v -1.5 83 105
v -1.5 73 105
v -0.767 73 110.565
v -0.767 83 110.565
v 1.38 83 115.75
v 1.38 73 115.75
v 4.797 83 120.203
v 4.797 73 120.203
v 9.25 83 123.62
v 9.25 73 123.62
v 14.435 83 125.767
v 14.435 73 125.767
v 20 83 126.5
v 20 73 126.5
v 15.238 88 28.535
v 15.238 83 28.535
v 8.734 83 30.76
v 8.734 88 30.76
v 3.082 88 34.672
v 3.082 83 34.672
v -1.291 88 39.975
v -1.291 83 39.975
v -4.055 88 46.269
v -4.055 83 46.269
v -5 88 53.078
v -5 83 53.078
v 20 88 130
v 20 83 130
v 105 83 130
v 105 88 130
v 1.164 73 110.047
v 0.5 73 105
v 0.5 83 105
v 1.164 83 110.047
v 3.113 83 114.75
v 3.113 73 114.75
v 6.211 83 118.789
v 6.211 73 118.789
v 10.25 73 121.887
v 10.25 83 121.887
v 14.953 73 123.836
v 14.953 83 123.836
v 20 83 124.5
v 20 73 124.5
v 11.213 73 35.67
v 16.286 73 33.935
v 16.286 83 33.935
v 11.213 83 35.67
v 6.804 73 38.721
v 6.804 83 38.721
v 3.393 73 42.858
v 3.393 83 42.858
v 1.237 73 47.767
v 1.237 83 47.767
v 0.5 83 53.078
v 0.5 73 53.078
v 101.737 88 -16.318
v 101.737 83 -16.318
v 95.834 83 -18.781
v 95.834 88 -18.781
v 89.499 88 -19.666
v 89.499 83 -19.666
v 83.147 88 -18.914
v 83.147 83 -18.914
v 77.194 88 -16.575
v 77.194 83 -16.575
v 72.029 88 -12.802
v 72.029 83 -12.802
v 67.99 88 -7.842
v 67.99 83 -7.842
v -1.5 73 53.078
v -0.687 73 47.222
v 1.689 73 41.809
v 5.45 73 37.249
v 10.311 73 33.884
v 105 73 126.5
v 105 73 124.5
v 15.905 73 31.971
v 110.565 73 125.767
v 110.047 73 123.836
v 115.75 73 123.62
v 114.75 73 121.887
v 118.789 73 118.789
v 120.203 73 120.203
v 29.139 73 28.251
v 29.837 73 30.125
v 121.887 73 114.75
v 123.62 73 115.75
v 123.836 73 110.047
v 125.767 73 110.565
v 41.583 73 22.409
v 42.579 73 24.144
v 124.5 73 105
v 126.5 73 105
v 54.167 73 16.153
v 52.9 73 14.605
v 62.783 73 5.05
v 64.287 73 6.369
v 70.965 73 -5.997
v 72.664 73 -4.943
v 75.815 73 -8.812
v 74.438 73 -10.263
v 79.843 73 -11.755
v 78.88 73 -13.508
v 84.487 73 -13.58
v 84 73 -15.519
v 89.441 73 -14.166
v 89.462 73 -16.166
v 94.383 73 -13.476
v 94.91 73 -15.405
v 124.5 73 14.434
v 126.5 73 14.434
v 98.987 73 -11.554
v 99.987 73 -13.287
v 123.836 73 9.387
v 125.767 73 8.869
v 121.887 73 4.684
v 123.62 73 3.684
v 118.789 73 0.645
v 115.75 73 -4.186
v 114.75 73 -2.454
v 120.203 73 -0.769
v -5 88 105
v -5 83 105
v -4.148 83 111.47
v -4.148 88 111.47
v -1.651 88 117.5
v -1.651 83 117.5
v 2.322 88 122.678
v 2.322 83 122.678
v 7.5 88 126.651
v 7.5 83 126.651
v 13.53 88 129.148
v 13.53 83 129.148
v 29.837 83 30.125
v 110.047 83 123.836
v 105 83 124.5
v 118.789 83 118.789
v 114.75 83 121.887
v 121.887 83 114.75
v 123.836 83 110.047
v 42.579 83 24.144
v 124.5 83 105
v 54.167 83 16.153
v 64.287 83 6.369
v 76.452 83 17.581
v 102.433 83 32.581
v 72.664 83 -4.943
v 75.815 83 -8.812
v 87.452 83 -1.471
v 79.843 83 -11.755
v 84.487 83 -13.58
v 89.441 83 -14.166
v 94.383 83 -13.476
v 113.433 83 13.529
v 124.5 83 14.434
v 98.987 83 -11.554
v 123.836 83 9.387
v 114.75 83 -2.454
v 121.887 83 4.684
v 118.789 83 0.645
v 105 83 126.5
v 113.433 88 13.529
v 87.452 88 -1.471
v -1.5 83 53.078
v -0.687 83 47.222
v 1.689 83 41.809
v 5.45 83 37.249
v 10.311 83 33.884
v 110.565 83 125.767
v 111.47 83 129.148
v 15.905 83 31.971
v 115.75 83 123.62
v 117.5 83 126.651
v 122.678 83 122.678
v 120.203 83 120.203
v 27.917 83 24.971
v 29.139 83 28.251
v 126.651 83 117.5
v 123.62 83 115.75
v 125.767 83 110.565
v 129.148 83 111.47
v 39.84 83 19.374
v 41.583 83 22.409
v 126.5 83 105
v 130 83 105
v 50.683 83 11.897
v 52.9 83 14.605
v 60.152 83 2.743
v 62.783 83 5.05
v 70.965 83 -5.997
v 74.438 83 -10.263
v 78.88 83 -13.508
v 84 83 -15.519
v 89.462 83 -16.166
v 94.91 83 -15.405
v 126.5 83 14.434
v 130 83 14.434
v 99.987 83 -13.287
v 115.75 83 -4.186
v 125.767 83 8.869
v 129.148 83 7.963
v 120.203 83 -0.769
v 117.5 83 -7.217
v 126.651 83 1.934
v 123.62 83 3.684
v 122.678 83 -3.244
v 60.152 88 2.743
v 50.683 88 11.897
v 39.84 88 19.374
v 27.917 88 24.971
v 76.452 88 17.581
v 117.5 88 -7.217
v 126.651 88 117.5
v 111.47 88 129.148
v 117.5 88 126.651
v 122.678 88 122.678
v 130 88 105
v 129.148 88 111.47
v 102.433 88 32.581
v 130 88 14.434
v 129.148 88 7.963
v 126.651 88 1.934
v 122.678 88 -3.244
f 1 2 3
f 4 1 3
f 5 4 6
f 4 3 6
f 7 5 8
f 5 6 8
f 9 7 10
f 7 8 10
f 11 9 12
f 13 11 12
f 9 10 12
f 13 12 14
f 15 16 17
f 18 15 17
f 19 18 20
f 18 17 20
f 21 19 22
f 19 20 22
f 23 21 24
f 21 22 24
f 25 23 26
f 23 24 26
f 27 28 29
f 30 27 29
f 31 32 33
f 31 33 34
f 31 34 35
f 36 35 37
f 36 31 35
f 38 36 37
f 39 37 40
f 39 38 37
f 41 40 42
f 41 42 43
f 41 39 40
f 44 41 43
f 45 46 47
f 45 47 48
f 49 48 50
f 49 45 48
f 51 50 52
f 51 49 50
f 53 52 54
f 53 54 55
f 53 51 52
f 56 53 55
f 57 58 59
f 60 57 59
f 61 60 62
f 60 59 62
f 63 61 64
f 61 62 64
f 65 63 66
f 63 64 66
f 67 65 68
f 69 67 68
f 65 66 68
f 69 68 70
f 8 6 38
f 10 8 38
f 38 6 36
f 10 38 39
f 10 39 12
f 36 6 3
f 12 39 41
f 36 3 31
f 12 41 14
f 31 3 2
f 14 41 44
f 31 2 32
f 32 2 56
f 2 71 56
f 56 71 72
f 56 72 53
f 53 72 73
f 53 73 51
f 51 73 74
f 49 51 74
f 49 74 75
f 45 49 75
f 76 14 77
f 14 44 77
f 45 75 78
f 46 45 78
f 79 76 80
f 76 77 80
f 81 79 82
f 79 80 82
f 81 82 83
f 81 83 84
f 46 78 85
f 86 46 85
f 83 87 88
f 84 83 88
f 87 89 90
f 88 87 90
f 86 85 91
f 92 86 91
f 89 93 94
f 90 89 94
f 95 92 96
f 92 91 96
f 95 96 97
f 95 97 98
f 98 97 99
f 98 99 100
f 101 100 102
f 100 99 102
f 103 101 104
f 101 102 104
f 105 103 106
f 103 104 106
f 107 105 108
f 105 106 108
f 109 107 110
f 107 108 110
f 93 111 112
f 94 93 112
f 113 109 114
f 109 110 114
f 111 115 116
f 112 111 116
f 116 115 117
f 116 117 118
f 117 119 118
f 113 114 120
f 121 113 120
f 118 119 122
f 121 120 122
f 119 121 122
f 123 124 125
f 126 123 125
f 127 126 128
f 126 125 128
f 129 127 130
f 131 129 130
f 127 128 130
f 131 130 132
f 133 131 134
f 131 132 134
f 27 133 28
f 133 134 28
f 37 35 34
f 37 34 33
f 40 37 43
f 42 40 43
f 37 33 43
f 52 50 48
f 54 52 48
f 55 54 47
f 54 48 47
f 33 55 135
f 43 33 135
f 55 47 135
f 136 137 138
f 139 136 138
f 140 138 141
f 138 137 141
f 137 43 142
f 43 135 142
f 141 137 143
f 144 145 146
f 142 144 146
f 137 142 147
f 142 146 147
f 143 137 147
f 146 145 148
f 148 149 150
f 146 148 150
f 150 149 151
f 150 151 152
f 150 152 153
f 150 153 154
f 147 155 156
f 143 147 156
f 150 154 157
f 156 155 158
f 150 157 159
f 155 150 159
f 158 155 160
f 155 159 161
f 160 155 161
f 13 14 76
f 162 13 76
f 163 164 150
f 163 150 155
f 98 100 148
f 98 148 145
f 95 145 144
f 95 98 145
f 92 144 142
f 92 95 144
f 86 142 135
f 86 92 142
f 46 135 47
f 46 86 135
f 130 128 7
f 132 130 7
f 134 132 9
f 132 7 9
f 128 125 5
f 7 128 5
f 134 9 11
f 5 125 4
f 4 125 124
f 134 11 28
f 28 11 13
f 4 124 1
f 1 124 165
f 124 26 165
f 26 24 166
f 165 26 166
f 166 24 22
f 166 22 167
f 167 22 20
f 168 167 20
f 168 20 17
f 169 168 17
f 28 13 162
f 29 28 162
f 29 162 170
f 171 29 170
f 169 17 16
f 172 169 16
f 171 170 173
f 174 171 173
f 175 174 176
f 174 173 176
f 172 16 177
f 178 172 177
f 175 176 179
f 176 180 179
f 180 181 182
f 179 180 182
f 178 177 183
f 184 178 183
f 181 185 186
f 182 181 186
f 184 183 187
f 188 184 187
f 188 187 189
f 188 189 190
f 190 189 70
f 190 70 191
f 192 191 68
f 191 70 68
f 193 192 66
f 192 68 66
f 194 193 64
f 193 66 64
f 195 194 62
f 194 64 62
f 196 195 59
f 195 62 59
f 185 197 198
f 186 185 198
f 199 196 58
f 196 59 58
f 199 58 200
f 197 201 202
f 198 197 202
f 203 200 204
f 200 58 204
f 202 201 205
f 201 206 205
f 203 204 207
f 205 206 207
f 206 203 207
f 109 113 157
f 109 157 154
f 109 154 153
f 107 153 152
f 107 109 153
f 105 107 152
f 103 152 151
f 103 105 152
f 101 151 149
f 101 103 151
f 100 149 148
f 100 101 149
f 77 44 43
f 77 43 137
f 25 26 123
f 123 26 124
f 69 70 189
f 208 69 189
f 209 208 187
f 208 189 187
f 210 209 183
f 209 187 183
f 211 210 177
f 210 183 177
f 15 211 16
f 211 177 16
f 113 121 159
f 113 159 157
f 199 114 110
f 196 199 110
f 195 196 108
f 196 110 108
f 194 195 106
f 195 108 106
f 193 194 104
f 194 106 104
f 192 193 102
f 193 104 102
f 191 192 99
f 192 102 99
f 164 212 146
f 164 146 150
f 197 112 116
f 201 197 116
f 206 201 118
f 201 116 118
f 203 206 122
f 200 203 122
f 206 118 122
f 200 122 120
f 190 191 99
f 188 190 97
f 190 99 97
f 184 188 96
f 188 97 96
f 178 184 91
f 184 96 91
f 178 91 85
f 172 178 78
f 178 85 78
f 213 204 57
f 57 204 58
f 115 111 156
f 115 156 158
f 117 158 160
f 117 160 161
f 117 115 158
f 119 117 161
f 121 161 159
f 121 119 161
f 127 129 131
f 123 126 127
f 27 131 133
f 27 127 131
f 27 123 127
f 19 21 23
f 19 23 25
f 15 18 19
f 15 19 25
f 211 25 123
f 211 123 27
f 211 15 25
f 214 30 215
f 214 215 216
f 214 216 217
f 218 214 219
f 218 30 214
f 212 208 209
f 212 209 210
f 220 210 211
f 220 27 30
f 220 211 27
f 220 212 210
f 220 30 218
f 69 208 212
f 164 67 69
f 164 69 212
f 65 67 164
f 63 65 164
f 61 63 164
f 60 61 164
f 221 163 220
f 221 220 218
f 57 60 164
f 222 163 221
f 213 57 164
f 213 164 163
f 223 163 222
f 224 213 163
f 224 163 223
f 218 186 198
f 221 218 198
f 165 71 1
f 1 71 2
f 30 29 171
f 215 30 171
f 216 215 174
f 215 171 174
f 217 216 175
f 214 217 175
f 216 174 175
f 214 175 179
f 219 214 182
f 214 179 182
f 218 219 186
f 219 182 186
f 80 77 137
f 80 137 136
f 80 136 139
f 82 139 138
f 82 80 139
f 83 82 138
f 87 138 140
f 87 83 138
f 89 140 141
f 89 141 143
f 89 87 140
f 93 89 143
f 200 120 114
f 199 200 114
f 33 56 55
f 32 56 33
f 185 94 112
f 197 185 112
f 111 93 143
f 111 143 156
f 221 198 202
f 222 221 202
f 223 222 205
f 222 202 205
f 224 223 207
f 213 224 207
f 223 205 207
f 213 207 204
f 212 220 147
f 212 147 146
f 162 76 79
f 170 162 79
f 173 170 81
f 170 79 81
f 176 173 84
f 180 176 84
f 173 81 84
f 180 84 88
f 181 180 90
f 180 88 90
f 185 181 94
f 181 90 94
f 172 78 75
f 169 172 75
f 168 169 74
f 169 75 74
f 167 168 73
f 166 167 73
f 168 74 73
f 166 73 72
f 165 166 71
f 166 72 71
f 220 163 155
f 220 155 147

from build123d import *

# Parameters (mm, degrees)
SKETCH1_W               = 260
SKETCH1_H               = 100
BOSS_EXTRUDE1_DEPTH     = 3
CUT_EXTRUDE1_DEPTH      = 5
SKETCH5_W               = 260
SKETCH5_H               = 80
BOSS_EXTRUDE4_DEPTH     = 3
BOSS_EXTRUDE5_START     = 70
BOSS_EXTRUDE5_DEPTH     = 70
BOSS_EXTRUDE6_DEPTH     = 70
CUT_EXTRUDE3_DEPTH      = 198.810515393
SKETCH10_R              = 5
SKETCH10_R_2            = 1.75
BOSS_EXTRUDE7_DEPTH     = 50
CHAMFER1_SIZE           = 5
CHAMFER1_SIZE2          = 8.660254038
FILLET1_R               = 22
FILLET2_R               = 25
CUT_EXTRUDE4_START      = 20
CUT_EXTRUDE4_DEPTH      = 20
SKETCH12_R              = 1.75
CUT_EXTRUDE5_DEPTH      = 20
CUT_EXTRUDE6_DEPTH      = 40
FILLET3_R               = 5
BOSS_EXTRUDE8_DEPTH     = 10
CUT_EXTRUDE7_DEPTH      = 202.715145688
CUT_EXTRUDE7_DEPTH_BACK = 202.715145688
SKETCH16_W              = 135
SKETCH16_H              = 73
BOSS_EXTRUDE9_DEPTH     = 5
CUT_EXTRUDE8_DEPTH      = 5


with BuildPart() as part:
    # Sketch1 → Boss-Extrude1 (new body)
    with BuildSketch(Plane(origin=(0, 0, 0), x_dir=(1, 0, 0), z_dir=(0, 1, 0))):
        Rectangle(SKETCH1_W, SKETCH1_H)
    extrude(amount=BOSS_EXTRUDE1_DEPTH)

    # Sketch4 → Cut-Extrude1 (cut)
    with BuildSketch(Plane(origin=(0, 3, 0), x_dir=(1, 0, 0), z_dir=(0, 1, 0))):
        with BuildLine():
            Line((-77.534249575, 30.291115131), (-130, 0))
            Line((-130, 0), (-130, 50))
            Line((-130, 50), (130, 50))
            Line((130, 50), (130, 0))
            Line((130, 0), (77.534249575, 30.291115131))
            ThreePointArc((77.534249575, 30.291115131), (0, -30), (-77.534249575, 30.291115131))
        make_face()
    extrude(amount=-CUT_EXTRUDE1_DEPTH, mode=Mode.SUBTRACT)

    # Sketch5 → Boss-Extrude4 (add)
    with BuildSketch(Plane(origin=(0, 3, 0), x_dir=(1, 0, 0), z_dir=(0, 1, 0))):
        with Locations((0, -90)):
            Rectangle(SKETCH5_W, SKETCH5_H)
    extrude(amount=-BOSS_EXTRUDE4_DEPTH)

    # Sketch6 → Boss-Extrude5 (add)
    with BuildSketch(Plane(origin=(0, 3, 0), x_dir=(1, 0, 0), z_dir=(0, 1, 0)).offset(BOSS_EXTRUDE5_START)):
        with BuildLine():
            Line((-77.534249575, 30.291115131), (-130, 0))
            Line((-130, 0), (-130, -130))
            Line((-130, -130), (130, -130))
            Line((130, -130), (130, 0))
            Line((130, 0), (77.534249575, 30.291115131))
            ThreePointArc((77.534249575, 30.291115131), (0, -30), (-77.534249575, 30.291115131))
        make_face()
        with BuildLine():
            Line((-79.381629809, 25.76042804), (-127, -1.732050808))
            Line((-127, -1.732050808), (-127, -127))
            Line((-127, -127), (127, -127))
            Line((127, -127), (127, -1.732050808))
            Line((127, -1.732050808), (79.381629809, 25.76042804))
            ThreePointArc((79.381629809, 25.76042804), (0, -33), (-79.381629809, 25.76042804))
        make_face(mode=Mode.SUBTRACT)
    extrude(amount=-BOSS_EXTRUDE5_DEPTH)

    # Sketch7 → Boss-Extrude6 (add)
    with BuildSketch(Plane(origin=(0, 73, 0), x_dir=(1, 0, 0), z_dir=(0, 1, 0))):
        with BuildLine():
            Line((-5, -32.849260709), (-5, -130))
            Line((-5, -130), (-2, -130))
            Line((-2, -130), (-2, -32.975900116))
            ThreePointArc((-2, -32.975900116), (-3.500572722, -32.92614781), (-5, -32.849260709))
        make_face()
    extrude(amount=-BOSS_EXTRUDE6_DEPTH)

    # Sketch9 → Cut-Extrude3 (cut, through all)
    with BuildSketch(Plane(origin=(0, 73, 0), x_dir=(1, 0, 0), z_dir=(0, 1, 0))):
        Polygon((-5, -32.849260709), (-5, -144.876678539), (-379.728059333, -144.876678539), (-379.728059333, 52.069032857), (-5, 52.069032857), align=None)
    extrude(amount=-CUT_EXTRUDE3_DEPTH, mode=Mode.SUBTRACT)

    # Sketch10 → Boss-Extrude7 (add)
    # profile 1 of 4: a face of its own
    with BuildSketch(Plane(origin=(0, 3, 0), x_dir=(1, 0, 0), z_dir=(0, 1, 0))):
        with Locations(Location((14, -46.75, 0), (0, 0, 90))):
            Circle(SKETCH10_R)
        with Locations(Location((14, -46.75, 0), (0, 0, 270))):
            Circle(SKETCH10_R_2, mode=Mode.SUBTRACT)
    # profile 2 of 4: a face of its own
    with BuildSketch(Plane(origin=(0, 3, 0), x_dir=(1, 0, 0), z_dir=(0, 1, 0))):
        with Locations(Location((86, -46.75, 0), (0, 0, 90))):
            Circle(SKETCH10_R)
        with Locations(Location((86, -46.75, 0), (0, 0, 270))):
            Circle(SKETCH10_R_2, mode=Mode.SUBTRACT)
    # profile 3 of 4: a face of its own
    with BuildSketch(Plane(origin=(0, 3, 0), x_dir=(1, 0, 0), z_dir=(0, 1, 0))):
        with Locations(Location((86, -113.25, 0), (0, 0, 90))):
            Circle(SKETCH10_R)
        with Locations(Location((86, -113.25, 0), (0, 0, 270))):
            Circle(SKETCH10_R_2, mode=Mode.SUBTRACT)
    # profile 4 of 4: a face of its own
    with BuildSketch(Plane(origin=(0, 3, 0), x_dir=(1, 0, 0), z_dir=(0, 1, 0))):
        with Locations(Location((14, -113.25, 0), (0, 0, 90))):
            Circle(SKETCH10_R)
        with Locations(Location((14, -113.25, 0), (0, 0, 270))):
            Circle(SKETCH10_R_2, mode=Mode.SUBTRACT)
    extrude(amount=BOSS_EXTRUDE7_DEPTH)

    # Chamfer1
    chamfer1_edges = [part.edges().sort_by_distance(p)[0] for p in [
        (86, 3, 51.75),
        (14, 3, 51.75),
        (86, 3, 118.25),
        (14, 3, 118.25),
    ]]
    chamfer1_side = [part.faces().sort_by_distance(p)[0] for p in [
        (68.049806081, 3, 64.998636776),
    ]]
    chamfer(chamfer1_edges, length=CHAMFER1_SIZE, length2=CHAMFER1_SIZE2, reference=chamfer1_side[0])

    # Fillet1
    fillet1_edges = [part.edges().sort_by_distance(p)[0] for p in [
        (-2, 38, 127),
        (-2, 38, 32.975900116),
        (127, 38, 127),
        (127, 38, 1.732050808),
        (79.381629809, 38, -25.76042804),
    ]]
    fillet(fillet1_edges, radius=FILLET1_R)

    # Fillet2
    fillet2_edges = [part.edges().sort_by_distance(p)[0] for p in [
        (-5, 36.5, 29.843597113),
        (-5, 36.5, 130),
        (77.534249575, 36.5, -30.291115131),
        (130, 36.5, 0),
        (130, 36.5, 130),
    ]]
    fillet(fillet2_edges, radius=FILLET2_R)

    # Sketch11 → Cut-Extrude4 (cut)
    with BuildSketch(Plane(origin=(0, 3, 0), x_dir=(1, 0, 0), z_dir=(0, 1, 0)).offset(CUT_EXTRUDE4_START)):
        with BuildLine():
            Line((52.464250206, -10.394556462), (54.431659589, -12.65935233))
            ThreePointArc((54.431659589, -12.65935233), (36.359512028, -24.612236832), (15.80952381, -31.480420697))
            Line((15.80952381, -31.480420697), (15.238095238, -28.53534525))
            ThreePointArc((15.238095238, -28.53534525), (35.045312798, -21.915408995), (52.464250206, -10.394556462))
        make_face()
        Polygon((101.737077009, 16.317606197), (100.237077009, 13.719529986), (116, 4.618802154), (117.5, 7.216878365), align=None)
    extrude(amount=-CUT_EXTRUDE4_DEPTH, mode=Mode.SUBTRACT)

    # Sketch12 → Cut-Extrude5 (cut)
    with BuildSketch(Plane(origin=(0, 3, 0), x_dir=(1, 0, 0), z_dir=(0, 1, 0))):
        with Locations(Location((89.237077009, -5.333028897, 0), (0, 0, 270))):
            Circle(SKETCH12_R)
        with Locations(Location((105, -105, 0), (0, 0, 270))):
            Circle(SKETCH12_R)
        with Locations(Location((15, -105, 0), (0, 0, 66.494954424))):
            Circle(SKETCH12_R)
        with Locations(Location((15, -55, 0), (0, 0, 260.317408662))):
            Circle(SKETCH12_R)
    extrude(amount=-CUT_EXTRUDE5_DEPTH, mode=Mode.SUBTRACT)

    # Sketch14 → Cut-Extrude6 (cut)
    with BuildSketch(Plane.XZ.offset(-23)):
        Polygon((101.737077009, -16.317606197), (117.5, -7.216878365), (116, -4.618802154), (100.237077009, -13.719529986), align=None)
    extrude(amount=-CUT_EXTRUDE6_DEPTH, mode=Mode.SUBTRACT)

    # Fillet3
    # the kernel refuses this fillet: 5 mm, written as the material it adds along each edge
    with BuildSketch(Plane(origin=(101.737077009, 3, -16.317606197), x_dir=(0.8660254037844373, 0, 0.5000000000000024), z_dir=(-0.5000000000000026, 0, 0.8660254037844373))) as fillet3_piece_1_section:
        with BuildLine():
            CenterArc((FILLET3_R, FILLET3_R), FILLET3_R, 180, 90)
            Line((0, FILLET3_R), (0, 0))
            Line((0, 0), (FILLET3_R, 0))
        make_face()
    fillet3_piece_1 = extrude(amount=15.5, mode=Mode.PRIVATE)
    fillet3_piece_1 = fillet3_piece_1 - Plane(origin=(89.237077009, 3.433810283, 5.333028897), x_dir=(-0.8498769238912803, 0, -0.5269812275945843), z_dir=(0, -1, 0)) * Cylinder(22, 52, mode=Mode.PRIVATE)
    add(fillet3_piece_1)
    with BuildSketch(Plane(origin=(109.75, 3, 6.206515394), x_dir=(-0.8660254037844346, 0, -0.500000000000007), z_dir=(0.500000000000007, 0, -0.8660254037844346))) as fillet3_piece_2_section:
        with BuildLine():
            CenterArc((FILLET3_R, FILLET3_R), FILLET3_R, 180, 90)
            Line((0, FILLET3_R), (0, 0))
            Line((0, 0), (FILLET3_R, 0))
        make_face()
    fillet3_piece_2 = extrude(amount=15.5, mode=Mode.PRIVATE)
    fillet3_piece_2 = fillet3_piece_2 - Plane(origin=(105, 4.115508028, 14.43375673), x_dir=(0.5000000000000037, 0, -0.8660254037844366), z_dir=(0, -1, 0)) * Cylinder(22, 51, mode=Mode.PRIVATE)
    add(fillet3_piece_2)
    with BuildSketch(Plane(origin=(44.266711112, 3, 0.957907015), x_dir=(-0.754931955778907, 0, 0.6558031275800951), z_dir=(0.6558031275800951, 0, 0.754931955778907))) as fillet3_piece_3_section:
        with BuildLine():
            CenterArc((FILLET3_R, -FILLET3_R), FILLET3_R, 90, 90)
            Line((0, -FILLET3_R), (0, 0))
            Line((0, 0), (FILLET3_R, 0))
        make_face()
    fillet3_piece_3 = extrude(amount=28, mode=Mode.PRIVATE)
    fillet3_piece_3 = fillet3_piece_3 & Plane(origin=(0, 4.116736713, -50), x_dir=(0.9564051784275456, 0, 0.2920430356590872), z_dir=(0, 1, 0)) * Cylinder(83, 77, mode=Mode.PRIVATE)
    fillet3_piece_3 = fillet3_piece_3 - Plane(origin=(0, 4.116736713, -50), x_dir=(0.9691781196921706, 0, 0.2463610608638238), z_dir=(0, 1, 0)) * Cylinder(80, 77, mode=Mode.PRIVATE)
    add(fillet3_piece_3)
    with BuildSketch(Plane(origin=(18.19047619, 3, 43.751568392), x_dir=(0.9816918156232519, 0, -0.19047619047619338), z_dir=(-0.19047619047619338, 0, -0.981691815623252))) as fillet3_piece_4_section:
        with BuildLine():
            CenterArc((FILLET3_R, -FILLET3_R), FILLET3_R, 90, 90)
            Line((0, -FILLET3_R), (0, 0))
            Line((0, 0), (FILLET3_R, 0))
        make_face()
    fillet3_piece_4 = extrude(amount=28, mode=Mode.PRIVATE)
    fillet3_piece_4 = fillet3_piece_4 - Plane(origin=(20, 4.115502573, 53.07764064), x_dir=(-0.19047619047619013, 0, -0.9816918156232526), z_dir=(0, -1, 0)) * Cylinder(22, 77, mode=Mode.PRIVATE)
    fillet3_piece_4 = fillet3_piece_4 - Plane(origin=(0, 4.115502573, -50), x_dir=(0.9691781196921706, 0, 0.2463610608638238), z_dir=(0, 1, 0)) * Cylinder(80, 77, mode=Mode.PRIVATE)
    add(fillet3_piece_4)
    with BuildSketch(Plane(origin=(44.266711112, 23, 0.957907015), x_dir=(-0.754931955778907, 0, 0.6558031275800951), z_dir=(0.6558031275800951, 0, 0.754931955778907))) as fillet3_piece_5_section:
        with BuildLine():
            CenterArc((FILLET3_R, FILLET3_R), FILLET3_R, 180, 90)
            Line((0, FILLET3_R), (0, 0))
            Line((0, 0), (FILLET3_R, 0))
        make_face()
    fillet3_piece_5 = extrude(amount=28, mode=Mode.PRIVATE)
    fillet3_piece_5 = fillet3_piece_5 & Plane(origin=(0, 21.883263287, -50), x_dir=(0.9564051784275456, 0, 0.2920430356590872), z_dir=(0, 1, 0)) * Cylinder(83, 77, mode=Mode.PRIVATE)
    fillet3_piece_5 = fillet3_piece_5 - Plane(origin=(0, 21.883263287, -50), x_dir=(0.9691781196921706, 0, 0.2463610608638238), z_dir=(0, 1, 0)) * Cylinder(80, 77, mode=Mode.PRIVATE)
    add(fillet3_piece_5)
    with BuildSketch(Plane(origin=(18.19047619, 23, 43.751568392), x_dir=(0, -1, 0), z_dir=(-0.19047619047619338, 0, -0.981691815623252))) as fillet3_piece_6_section:
        with BuildLine():
            CenterArc((FILLET3_R, -FILLET3_R), FILLET3_R, 90, 90)
            Line((0, -FILLET3_R), (0, 0))
            Line((0, 0), (FILLET3_R, 0))
        make_face()
    fillet3_piece_6 = extrude(amount=28, mode=Mode.PRIVATE)
    fillet3_piece_6 = fillet3_piece_6 & Plane(origin=(0, 21.870297326, -50), x_dir=(0.9564051784275456, 0, 0.2920430356590872), z_dir=(0, 1, 0)) * Cylinder(83, 77, mode=Mode.PRIVATE)
    fillet3_piece_6 = fillet3_piece_6 - Plane(origin=(0, 21.870297326, -50), x_dir=(0.9691781196921706, 0, 0.2463610608638238), z_dir=(0, 1, 0)) * Cylinder(80, 77, mode=Mode.PRIVATE)
    add(fillet3_piece_6)
    with BuildSketch(Plane(origin=(100.237077009, 63, -13.719529986), x_dir=(0.866025403784437, 0, 0.5000000000000028), z_dir=(0.5000000000000028, 0, -0.866025403784437))) as fillet3_piece_7:
        with BuildLine():
            CenterArc((FILLET3_R, FILLET3_R), FILLET3_R, 180, 90)
            Line((0, FILLET3_R), (0, 0))
            Line((0, 0), (FILLET3_R, 0))
        make_face()
    extrude(amount=3)
    with BuildSketch(Plane(origin=(117.5, 63, -7.216878365), x_dir=(0, -1, 0), z_dir=(-0.500000000000007, 0, 0.8660254037844346))) as fillet3_piece_8:
        with BuildLine():
            CenterArc((FILLET3_R, -FILLET3_R), FILLET3_R, 90, 90)
            Line((0, -FILLET3_R), (0, 0))
            Line((0, 0), (FILLET3_R, 0))
        make_face()
    extrude(amount=3)

    # Sketch16 → Cut-Extrude7 (cut, two sides: drawn at the far end of the back side and taken through both)
    with BuildSketch(Plane.XY.offset(-CUT_EXTRUDE7_DEPTH_BACK)):
        with Locations((62.5, 36.5)):
            Rectangle(SKETCH16_W, SKETCH16_H)
    extrude(amount=CUT_EXTRUDE7_DEPTH + CUT_EXTRUDE7_DEPTH_BACK, mode=Mode.SUBTRACT)


with BuildPart() as body_2:
    # Sketch15 → Boss-Extrude8 (new body)
    with BuildSketch(Plane(origin=(0, 73, 0), x_dir=(1, 0, 0), z_dir=(0, 1, 0))):
        with BuildLine():
            Line((126.5, -105), (126.5, -14.43375673))
            ThreePointArc((126.5, -14.43375673), (123.619546181, -3.68375673), (115.75, 4.185789452))
            Line((115.75, 4.185789452), (99.987077009, 13.286517284))
            ThreePointArc((99.987077009, 13.286517284), (83.999666249, 15.519297796), (70.964723145, 5.997067496))
            ThreePointArc((70.964723145, 5.997067496), (47.402272696, -18.740632403), (15.904761905, -31.971266605))
            ThreePointArc((15.904761905, -31.971266605), (3.412389879, -39.399146919), (-1.5, -53.07764064))
            Line((-1.5, -53.07764064), (-1.5, -105))
            ThreePointArc((-1.5, -105), (4.797204204, -120.202795796), (20, -126.5))
            Line((20, -126.5), (105, -126.5))
            ThreePointArc((105, -126.5), (120.202795796, -120.202795796), (126.5, -105))
        make_face()
        with BuildLine():
            Line((124.5, -105), (124.5, -14.43375673))
            ThreePointArc((124.5, -14.43375673), (121.887495374, -4.68375673), (114.75, 2.453738644))
            Line((114.75, 2.453738644), (98.987077009, 11.554466476))
            ThreePointArc((98.987077009, 11.554466476), (84.48686725, 13.579546476), (72.664476993, 4.943105041))
            ThreePointArc((72.664476993, 4.943105041), (48.537656474, -20.387114617), (16.285714286, -33.934650236))
            ThreePointArc((16.285714286, -33.934650236), (4.955423379, -40.67156494), (0.5, -53.07764064))
            Line((0.5, -53.07764064), (0.5, -105))
            ThreePointArc((0.5, -105), (6.211417767, -118.788582233), (20, -124.5))
            Line((20, -124.5), (105, -124.5))
            ThreePointArc((105, -124.5), (118.788582233, -118.788582233), (124.5, -105))
        make_face(mode=Mode.SUBTRACT)
    extrude(amount=BOSS_EXTRUDE8_DEPTH)

    # Sketch17 → Boss-Extrude9 (add)
    with BuildSketch(Plane(origin=(0, 83, 0), x_dir=(1, 0, 0), z_dir=(0, 1, 0))):
        with BuildLine():
            Line((130, -105), (130, -14.43375673))
            ThreePointArc((130, -14.43375673), (126.650635095, -1.93375673), (117.5, 7.216878365))
            Line((117.5, 7.216878365), (101.737077009, 16.317606197))
            ThreePointArc((101.737077009, 16.317606197), (83.147064497, 18.913862607), (67.990153911, 7.841501792))
            ThreePointArc((67.990153911, 7.841501792), (45.415351086, -15.85928853), (15.238095238, -28.53534525))
            ThreePointArc((15.238095238, -28.53534525), (0.712081255, -37.172415383), (-5, -53.07764064))
            Line((-5, -53.07764064), (-5, -105))
            ThreePointArc((-5, -105), (2.32233047, -122.67766953), (20, -130))
            Line((20, -130), (105, -130))
            ThreePointArc((105, -130), (122.67766953, -122.67766953), (130, -105))
        make_face()
    extrude(amount=BOSS_EXTRUDE9_DEPTH)

    # Sketch18 → Cut-Extrude8 (cut)
    with BuildSketch(Plane(origin=(0, 88, 0), x_dir=(1, 0, 0), z_dir=(0, 1, 0))):
        Polygon((87.451905284, 1.47114317), (113.432667397, -13.52885683), (102.432667397, -32.581415713), (76.451905284, -17.581415713), align=None)
    extrude(amount=-CUT_EXTRUDE8_DEPTH, mode=Mode.SUBTRACT)


solid = body_2.part
